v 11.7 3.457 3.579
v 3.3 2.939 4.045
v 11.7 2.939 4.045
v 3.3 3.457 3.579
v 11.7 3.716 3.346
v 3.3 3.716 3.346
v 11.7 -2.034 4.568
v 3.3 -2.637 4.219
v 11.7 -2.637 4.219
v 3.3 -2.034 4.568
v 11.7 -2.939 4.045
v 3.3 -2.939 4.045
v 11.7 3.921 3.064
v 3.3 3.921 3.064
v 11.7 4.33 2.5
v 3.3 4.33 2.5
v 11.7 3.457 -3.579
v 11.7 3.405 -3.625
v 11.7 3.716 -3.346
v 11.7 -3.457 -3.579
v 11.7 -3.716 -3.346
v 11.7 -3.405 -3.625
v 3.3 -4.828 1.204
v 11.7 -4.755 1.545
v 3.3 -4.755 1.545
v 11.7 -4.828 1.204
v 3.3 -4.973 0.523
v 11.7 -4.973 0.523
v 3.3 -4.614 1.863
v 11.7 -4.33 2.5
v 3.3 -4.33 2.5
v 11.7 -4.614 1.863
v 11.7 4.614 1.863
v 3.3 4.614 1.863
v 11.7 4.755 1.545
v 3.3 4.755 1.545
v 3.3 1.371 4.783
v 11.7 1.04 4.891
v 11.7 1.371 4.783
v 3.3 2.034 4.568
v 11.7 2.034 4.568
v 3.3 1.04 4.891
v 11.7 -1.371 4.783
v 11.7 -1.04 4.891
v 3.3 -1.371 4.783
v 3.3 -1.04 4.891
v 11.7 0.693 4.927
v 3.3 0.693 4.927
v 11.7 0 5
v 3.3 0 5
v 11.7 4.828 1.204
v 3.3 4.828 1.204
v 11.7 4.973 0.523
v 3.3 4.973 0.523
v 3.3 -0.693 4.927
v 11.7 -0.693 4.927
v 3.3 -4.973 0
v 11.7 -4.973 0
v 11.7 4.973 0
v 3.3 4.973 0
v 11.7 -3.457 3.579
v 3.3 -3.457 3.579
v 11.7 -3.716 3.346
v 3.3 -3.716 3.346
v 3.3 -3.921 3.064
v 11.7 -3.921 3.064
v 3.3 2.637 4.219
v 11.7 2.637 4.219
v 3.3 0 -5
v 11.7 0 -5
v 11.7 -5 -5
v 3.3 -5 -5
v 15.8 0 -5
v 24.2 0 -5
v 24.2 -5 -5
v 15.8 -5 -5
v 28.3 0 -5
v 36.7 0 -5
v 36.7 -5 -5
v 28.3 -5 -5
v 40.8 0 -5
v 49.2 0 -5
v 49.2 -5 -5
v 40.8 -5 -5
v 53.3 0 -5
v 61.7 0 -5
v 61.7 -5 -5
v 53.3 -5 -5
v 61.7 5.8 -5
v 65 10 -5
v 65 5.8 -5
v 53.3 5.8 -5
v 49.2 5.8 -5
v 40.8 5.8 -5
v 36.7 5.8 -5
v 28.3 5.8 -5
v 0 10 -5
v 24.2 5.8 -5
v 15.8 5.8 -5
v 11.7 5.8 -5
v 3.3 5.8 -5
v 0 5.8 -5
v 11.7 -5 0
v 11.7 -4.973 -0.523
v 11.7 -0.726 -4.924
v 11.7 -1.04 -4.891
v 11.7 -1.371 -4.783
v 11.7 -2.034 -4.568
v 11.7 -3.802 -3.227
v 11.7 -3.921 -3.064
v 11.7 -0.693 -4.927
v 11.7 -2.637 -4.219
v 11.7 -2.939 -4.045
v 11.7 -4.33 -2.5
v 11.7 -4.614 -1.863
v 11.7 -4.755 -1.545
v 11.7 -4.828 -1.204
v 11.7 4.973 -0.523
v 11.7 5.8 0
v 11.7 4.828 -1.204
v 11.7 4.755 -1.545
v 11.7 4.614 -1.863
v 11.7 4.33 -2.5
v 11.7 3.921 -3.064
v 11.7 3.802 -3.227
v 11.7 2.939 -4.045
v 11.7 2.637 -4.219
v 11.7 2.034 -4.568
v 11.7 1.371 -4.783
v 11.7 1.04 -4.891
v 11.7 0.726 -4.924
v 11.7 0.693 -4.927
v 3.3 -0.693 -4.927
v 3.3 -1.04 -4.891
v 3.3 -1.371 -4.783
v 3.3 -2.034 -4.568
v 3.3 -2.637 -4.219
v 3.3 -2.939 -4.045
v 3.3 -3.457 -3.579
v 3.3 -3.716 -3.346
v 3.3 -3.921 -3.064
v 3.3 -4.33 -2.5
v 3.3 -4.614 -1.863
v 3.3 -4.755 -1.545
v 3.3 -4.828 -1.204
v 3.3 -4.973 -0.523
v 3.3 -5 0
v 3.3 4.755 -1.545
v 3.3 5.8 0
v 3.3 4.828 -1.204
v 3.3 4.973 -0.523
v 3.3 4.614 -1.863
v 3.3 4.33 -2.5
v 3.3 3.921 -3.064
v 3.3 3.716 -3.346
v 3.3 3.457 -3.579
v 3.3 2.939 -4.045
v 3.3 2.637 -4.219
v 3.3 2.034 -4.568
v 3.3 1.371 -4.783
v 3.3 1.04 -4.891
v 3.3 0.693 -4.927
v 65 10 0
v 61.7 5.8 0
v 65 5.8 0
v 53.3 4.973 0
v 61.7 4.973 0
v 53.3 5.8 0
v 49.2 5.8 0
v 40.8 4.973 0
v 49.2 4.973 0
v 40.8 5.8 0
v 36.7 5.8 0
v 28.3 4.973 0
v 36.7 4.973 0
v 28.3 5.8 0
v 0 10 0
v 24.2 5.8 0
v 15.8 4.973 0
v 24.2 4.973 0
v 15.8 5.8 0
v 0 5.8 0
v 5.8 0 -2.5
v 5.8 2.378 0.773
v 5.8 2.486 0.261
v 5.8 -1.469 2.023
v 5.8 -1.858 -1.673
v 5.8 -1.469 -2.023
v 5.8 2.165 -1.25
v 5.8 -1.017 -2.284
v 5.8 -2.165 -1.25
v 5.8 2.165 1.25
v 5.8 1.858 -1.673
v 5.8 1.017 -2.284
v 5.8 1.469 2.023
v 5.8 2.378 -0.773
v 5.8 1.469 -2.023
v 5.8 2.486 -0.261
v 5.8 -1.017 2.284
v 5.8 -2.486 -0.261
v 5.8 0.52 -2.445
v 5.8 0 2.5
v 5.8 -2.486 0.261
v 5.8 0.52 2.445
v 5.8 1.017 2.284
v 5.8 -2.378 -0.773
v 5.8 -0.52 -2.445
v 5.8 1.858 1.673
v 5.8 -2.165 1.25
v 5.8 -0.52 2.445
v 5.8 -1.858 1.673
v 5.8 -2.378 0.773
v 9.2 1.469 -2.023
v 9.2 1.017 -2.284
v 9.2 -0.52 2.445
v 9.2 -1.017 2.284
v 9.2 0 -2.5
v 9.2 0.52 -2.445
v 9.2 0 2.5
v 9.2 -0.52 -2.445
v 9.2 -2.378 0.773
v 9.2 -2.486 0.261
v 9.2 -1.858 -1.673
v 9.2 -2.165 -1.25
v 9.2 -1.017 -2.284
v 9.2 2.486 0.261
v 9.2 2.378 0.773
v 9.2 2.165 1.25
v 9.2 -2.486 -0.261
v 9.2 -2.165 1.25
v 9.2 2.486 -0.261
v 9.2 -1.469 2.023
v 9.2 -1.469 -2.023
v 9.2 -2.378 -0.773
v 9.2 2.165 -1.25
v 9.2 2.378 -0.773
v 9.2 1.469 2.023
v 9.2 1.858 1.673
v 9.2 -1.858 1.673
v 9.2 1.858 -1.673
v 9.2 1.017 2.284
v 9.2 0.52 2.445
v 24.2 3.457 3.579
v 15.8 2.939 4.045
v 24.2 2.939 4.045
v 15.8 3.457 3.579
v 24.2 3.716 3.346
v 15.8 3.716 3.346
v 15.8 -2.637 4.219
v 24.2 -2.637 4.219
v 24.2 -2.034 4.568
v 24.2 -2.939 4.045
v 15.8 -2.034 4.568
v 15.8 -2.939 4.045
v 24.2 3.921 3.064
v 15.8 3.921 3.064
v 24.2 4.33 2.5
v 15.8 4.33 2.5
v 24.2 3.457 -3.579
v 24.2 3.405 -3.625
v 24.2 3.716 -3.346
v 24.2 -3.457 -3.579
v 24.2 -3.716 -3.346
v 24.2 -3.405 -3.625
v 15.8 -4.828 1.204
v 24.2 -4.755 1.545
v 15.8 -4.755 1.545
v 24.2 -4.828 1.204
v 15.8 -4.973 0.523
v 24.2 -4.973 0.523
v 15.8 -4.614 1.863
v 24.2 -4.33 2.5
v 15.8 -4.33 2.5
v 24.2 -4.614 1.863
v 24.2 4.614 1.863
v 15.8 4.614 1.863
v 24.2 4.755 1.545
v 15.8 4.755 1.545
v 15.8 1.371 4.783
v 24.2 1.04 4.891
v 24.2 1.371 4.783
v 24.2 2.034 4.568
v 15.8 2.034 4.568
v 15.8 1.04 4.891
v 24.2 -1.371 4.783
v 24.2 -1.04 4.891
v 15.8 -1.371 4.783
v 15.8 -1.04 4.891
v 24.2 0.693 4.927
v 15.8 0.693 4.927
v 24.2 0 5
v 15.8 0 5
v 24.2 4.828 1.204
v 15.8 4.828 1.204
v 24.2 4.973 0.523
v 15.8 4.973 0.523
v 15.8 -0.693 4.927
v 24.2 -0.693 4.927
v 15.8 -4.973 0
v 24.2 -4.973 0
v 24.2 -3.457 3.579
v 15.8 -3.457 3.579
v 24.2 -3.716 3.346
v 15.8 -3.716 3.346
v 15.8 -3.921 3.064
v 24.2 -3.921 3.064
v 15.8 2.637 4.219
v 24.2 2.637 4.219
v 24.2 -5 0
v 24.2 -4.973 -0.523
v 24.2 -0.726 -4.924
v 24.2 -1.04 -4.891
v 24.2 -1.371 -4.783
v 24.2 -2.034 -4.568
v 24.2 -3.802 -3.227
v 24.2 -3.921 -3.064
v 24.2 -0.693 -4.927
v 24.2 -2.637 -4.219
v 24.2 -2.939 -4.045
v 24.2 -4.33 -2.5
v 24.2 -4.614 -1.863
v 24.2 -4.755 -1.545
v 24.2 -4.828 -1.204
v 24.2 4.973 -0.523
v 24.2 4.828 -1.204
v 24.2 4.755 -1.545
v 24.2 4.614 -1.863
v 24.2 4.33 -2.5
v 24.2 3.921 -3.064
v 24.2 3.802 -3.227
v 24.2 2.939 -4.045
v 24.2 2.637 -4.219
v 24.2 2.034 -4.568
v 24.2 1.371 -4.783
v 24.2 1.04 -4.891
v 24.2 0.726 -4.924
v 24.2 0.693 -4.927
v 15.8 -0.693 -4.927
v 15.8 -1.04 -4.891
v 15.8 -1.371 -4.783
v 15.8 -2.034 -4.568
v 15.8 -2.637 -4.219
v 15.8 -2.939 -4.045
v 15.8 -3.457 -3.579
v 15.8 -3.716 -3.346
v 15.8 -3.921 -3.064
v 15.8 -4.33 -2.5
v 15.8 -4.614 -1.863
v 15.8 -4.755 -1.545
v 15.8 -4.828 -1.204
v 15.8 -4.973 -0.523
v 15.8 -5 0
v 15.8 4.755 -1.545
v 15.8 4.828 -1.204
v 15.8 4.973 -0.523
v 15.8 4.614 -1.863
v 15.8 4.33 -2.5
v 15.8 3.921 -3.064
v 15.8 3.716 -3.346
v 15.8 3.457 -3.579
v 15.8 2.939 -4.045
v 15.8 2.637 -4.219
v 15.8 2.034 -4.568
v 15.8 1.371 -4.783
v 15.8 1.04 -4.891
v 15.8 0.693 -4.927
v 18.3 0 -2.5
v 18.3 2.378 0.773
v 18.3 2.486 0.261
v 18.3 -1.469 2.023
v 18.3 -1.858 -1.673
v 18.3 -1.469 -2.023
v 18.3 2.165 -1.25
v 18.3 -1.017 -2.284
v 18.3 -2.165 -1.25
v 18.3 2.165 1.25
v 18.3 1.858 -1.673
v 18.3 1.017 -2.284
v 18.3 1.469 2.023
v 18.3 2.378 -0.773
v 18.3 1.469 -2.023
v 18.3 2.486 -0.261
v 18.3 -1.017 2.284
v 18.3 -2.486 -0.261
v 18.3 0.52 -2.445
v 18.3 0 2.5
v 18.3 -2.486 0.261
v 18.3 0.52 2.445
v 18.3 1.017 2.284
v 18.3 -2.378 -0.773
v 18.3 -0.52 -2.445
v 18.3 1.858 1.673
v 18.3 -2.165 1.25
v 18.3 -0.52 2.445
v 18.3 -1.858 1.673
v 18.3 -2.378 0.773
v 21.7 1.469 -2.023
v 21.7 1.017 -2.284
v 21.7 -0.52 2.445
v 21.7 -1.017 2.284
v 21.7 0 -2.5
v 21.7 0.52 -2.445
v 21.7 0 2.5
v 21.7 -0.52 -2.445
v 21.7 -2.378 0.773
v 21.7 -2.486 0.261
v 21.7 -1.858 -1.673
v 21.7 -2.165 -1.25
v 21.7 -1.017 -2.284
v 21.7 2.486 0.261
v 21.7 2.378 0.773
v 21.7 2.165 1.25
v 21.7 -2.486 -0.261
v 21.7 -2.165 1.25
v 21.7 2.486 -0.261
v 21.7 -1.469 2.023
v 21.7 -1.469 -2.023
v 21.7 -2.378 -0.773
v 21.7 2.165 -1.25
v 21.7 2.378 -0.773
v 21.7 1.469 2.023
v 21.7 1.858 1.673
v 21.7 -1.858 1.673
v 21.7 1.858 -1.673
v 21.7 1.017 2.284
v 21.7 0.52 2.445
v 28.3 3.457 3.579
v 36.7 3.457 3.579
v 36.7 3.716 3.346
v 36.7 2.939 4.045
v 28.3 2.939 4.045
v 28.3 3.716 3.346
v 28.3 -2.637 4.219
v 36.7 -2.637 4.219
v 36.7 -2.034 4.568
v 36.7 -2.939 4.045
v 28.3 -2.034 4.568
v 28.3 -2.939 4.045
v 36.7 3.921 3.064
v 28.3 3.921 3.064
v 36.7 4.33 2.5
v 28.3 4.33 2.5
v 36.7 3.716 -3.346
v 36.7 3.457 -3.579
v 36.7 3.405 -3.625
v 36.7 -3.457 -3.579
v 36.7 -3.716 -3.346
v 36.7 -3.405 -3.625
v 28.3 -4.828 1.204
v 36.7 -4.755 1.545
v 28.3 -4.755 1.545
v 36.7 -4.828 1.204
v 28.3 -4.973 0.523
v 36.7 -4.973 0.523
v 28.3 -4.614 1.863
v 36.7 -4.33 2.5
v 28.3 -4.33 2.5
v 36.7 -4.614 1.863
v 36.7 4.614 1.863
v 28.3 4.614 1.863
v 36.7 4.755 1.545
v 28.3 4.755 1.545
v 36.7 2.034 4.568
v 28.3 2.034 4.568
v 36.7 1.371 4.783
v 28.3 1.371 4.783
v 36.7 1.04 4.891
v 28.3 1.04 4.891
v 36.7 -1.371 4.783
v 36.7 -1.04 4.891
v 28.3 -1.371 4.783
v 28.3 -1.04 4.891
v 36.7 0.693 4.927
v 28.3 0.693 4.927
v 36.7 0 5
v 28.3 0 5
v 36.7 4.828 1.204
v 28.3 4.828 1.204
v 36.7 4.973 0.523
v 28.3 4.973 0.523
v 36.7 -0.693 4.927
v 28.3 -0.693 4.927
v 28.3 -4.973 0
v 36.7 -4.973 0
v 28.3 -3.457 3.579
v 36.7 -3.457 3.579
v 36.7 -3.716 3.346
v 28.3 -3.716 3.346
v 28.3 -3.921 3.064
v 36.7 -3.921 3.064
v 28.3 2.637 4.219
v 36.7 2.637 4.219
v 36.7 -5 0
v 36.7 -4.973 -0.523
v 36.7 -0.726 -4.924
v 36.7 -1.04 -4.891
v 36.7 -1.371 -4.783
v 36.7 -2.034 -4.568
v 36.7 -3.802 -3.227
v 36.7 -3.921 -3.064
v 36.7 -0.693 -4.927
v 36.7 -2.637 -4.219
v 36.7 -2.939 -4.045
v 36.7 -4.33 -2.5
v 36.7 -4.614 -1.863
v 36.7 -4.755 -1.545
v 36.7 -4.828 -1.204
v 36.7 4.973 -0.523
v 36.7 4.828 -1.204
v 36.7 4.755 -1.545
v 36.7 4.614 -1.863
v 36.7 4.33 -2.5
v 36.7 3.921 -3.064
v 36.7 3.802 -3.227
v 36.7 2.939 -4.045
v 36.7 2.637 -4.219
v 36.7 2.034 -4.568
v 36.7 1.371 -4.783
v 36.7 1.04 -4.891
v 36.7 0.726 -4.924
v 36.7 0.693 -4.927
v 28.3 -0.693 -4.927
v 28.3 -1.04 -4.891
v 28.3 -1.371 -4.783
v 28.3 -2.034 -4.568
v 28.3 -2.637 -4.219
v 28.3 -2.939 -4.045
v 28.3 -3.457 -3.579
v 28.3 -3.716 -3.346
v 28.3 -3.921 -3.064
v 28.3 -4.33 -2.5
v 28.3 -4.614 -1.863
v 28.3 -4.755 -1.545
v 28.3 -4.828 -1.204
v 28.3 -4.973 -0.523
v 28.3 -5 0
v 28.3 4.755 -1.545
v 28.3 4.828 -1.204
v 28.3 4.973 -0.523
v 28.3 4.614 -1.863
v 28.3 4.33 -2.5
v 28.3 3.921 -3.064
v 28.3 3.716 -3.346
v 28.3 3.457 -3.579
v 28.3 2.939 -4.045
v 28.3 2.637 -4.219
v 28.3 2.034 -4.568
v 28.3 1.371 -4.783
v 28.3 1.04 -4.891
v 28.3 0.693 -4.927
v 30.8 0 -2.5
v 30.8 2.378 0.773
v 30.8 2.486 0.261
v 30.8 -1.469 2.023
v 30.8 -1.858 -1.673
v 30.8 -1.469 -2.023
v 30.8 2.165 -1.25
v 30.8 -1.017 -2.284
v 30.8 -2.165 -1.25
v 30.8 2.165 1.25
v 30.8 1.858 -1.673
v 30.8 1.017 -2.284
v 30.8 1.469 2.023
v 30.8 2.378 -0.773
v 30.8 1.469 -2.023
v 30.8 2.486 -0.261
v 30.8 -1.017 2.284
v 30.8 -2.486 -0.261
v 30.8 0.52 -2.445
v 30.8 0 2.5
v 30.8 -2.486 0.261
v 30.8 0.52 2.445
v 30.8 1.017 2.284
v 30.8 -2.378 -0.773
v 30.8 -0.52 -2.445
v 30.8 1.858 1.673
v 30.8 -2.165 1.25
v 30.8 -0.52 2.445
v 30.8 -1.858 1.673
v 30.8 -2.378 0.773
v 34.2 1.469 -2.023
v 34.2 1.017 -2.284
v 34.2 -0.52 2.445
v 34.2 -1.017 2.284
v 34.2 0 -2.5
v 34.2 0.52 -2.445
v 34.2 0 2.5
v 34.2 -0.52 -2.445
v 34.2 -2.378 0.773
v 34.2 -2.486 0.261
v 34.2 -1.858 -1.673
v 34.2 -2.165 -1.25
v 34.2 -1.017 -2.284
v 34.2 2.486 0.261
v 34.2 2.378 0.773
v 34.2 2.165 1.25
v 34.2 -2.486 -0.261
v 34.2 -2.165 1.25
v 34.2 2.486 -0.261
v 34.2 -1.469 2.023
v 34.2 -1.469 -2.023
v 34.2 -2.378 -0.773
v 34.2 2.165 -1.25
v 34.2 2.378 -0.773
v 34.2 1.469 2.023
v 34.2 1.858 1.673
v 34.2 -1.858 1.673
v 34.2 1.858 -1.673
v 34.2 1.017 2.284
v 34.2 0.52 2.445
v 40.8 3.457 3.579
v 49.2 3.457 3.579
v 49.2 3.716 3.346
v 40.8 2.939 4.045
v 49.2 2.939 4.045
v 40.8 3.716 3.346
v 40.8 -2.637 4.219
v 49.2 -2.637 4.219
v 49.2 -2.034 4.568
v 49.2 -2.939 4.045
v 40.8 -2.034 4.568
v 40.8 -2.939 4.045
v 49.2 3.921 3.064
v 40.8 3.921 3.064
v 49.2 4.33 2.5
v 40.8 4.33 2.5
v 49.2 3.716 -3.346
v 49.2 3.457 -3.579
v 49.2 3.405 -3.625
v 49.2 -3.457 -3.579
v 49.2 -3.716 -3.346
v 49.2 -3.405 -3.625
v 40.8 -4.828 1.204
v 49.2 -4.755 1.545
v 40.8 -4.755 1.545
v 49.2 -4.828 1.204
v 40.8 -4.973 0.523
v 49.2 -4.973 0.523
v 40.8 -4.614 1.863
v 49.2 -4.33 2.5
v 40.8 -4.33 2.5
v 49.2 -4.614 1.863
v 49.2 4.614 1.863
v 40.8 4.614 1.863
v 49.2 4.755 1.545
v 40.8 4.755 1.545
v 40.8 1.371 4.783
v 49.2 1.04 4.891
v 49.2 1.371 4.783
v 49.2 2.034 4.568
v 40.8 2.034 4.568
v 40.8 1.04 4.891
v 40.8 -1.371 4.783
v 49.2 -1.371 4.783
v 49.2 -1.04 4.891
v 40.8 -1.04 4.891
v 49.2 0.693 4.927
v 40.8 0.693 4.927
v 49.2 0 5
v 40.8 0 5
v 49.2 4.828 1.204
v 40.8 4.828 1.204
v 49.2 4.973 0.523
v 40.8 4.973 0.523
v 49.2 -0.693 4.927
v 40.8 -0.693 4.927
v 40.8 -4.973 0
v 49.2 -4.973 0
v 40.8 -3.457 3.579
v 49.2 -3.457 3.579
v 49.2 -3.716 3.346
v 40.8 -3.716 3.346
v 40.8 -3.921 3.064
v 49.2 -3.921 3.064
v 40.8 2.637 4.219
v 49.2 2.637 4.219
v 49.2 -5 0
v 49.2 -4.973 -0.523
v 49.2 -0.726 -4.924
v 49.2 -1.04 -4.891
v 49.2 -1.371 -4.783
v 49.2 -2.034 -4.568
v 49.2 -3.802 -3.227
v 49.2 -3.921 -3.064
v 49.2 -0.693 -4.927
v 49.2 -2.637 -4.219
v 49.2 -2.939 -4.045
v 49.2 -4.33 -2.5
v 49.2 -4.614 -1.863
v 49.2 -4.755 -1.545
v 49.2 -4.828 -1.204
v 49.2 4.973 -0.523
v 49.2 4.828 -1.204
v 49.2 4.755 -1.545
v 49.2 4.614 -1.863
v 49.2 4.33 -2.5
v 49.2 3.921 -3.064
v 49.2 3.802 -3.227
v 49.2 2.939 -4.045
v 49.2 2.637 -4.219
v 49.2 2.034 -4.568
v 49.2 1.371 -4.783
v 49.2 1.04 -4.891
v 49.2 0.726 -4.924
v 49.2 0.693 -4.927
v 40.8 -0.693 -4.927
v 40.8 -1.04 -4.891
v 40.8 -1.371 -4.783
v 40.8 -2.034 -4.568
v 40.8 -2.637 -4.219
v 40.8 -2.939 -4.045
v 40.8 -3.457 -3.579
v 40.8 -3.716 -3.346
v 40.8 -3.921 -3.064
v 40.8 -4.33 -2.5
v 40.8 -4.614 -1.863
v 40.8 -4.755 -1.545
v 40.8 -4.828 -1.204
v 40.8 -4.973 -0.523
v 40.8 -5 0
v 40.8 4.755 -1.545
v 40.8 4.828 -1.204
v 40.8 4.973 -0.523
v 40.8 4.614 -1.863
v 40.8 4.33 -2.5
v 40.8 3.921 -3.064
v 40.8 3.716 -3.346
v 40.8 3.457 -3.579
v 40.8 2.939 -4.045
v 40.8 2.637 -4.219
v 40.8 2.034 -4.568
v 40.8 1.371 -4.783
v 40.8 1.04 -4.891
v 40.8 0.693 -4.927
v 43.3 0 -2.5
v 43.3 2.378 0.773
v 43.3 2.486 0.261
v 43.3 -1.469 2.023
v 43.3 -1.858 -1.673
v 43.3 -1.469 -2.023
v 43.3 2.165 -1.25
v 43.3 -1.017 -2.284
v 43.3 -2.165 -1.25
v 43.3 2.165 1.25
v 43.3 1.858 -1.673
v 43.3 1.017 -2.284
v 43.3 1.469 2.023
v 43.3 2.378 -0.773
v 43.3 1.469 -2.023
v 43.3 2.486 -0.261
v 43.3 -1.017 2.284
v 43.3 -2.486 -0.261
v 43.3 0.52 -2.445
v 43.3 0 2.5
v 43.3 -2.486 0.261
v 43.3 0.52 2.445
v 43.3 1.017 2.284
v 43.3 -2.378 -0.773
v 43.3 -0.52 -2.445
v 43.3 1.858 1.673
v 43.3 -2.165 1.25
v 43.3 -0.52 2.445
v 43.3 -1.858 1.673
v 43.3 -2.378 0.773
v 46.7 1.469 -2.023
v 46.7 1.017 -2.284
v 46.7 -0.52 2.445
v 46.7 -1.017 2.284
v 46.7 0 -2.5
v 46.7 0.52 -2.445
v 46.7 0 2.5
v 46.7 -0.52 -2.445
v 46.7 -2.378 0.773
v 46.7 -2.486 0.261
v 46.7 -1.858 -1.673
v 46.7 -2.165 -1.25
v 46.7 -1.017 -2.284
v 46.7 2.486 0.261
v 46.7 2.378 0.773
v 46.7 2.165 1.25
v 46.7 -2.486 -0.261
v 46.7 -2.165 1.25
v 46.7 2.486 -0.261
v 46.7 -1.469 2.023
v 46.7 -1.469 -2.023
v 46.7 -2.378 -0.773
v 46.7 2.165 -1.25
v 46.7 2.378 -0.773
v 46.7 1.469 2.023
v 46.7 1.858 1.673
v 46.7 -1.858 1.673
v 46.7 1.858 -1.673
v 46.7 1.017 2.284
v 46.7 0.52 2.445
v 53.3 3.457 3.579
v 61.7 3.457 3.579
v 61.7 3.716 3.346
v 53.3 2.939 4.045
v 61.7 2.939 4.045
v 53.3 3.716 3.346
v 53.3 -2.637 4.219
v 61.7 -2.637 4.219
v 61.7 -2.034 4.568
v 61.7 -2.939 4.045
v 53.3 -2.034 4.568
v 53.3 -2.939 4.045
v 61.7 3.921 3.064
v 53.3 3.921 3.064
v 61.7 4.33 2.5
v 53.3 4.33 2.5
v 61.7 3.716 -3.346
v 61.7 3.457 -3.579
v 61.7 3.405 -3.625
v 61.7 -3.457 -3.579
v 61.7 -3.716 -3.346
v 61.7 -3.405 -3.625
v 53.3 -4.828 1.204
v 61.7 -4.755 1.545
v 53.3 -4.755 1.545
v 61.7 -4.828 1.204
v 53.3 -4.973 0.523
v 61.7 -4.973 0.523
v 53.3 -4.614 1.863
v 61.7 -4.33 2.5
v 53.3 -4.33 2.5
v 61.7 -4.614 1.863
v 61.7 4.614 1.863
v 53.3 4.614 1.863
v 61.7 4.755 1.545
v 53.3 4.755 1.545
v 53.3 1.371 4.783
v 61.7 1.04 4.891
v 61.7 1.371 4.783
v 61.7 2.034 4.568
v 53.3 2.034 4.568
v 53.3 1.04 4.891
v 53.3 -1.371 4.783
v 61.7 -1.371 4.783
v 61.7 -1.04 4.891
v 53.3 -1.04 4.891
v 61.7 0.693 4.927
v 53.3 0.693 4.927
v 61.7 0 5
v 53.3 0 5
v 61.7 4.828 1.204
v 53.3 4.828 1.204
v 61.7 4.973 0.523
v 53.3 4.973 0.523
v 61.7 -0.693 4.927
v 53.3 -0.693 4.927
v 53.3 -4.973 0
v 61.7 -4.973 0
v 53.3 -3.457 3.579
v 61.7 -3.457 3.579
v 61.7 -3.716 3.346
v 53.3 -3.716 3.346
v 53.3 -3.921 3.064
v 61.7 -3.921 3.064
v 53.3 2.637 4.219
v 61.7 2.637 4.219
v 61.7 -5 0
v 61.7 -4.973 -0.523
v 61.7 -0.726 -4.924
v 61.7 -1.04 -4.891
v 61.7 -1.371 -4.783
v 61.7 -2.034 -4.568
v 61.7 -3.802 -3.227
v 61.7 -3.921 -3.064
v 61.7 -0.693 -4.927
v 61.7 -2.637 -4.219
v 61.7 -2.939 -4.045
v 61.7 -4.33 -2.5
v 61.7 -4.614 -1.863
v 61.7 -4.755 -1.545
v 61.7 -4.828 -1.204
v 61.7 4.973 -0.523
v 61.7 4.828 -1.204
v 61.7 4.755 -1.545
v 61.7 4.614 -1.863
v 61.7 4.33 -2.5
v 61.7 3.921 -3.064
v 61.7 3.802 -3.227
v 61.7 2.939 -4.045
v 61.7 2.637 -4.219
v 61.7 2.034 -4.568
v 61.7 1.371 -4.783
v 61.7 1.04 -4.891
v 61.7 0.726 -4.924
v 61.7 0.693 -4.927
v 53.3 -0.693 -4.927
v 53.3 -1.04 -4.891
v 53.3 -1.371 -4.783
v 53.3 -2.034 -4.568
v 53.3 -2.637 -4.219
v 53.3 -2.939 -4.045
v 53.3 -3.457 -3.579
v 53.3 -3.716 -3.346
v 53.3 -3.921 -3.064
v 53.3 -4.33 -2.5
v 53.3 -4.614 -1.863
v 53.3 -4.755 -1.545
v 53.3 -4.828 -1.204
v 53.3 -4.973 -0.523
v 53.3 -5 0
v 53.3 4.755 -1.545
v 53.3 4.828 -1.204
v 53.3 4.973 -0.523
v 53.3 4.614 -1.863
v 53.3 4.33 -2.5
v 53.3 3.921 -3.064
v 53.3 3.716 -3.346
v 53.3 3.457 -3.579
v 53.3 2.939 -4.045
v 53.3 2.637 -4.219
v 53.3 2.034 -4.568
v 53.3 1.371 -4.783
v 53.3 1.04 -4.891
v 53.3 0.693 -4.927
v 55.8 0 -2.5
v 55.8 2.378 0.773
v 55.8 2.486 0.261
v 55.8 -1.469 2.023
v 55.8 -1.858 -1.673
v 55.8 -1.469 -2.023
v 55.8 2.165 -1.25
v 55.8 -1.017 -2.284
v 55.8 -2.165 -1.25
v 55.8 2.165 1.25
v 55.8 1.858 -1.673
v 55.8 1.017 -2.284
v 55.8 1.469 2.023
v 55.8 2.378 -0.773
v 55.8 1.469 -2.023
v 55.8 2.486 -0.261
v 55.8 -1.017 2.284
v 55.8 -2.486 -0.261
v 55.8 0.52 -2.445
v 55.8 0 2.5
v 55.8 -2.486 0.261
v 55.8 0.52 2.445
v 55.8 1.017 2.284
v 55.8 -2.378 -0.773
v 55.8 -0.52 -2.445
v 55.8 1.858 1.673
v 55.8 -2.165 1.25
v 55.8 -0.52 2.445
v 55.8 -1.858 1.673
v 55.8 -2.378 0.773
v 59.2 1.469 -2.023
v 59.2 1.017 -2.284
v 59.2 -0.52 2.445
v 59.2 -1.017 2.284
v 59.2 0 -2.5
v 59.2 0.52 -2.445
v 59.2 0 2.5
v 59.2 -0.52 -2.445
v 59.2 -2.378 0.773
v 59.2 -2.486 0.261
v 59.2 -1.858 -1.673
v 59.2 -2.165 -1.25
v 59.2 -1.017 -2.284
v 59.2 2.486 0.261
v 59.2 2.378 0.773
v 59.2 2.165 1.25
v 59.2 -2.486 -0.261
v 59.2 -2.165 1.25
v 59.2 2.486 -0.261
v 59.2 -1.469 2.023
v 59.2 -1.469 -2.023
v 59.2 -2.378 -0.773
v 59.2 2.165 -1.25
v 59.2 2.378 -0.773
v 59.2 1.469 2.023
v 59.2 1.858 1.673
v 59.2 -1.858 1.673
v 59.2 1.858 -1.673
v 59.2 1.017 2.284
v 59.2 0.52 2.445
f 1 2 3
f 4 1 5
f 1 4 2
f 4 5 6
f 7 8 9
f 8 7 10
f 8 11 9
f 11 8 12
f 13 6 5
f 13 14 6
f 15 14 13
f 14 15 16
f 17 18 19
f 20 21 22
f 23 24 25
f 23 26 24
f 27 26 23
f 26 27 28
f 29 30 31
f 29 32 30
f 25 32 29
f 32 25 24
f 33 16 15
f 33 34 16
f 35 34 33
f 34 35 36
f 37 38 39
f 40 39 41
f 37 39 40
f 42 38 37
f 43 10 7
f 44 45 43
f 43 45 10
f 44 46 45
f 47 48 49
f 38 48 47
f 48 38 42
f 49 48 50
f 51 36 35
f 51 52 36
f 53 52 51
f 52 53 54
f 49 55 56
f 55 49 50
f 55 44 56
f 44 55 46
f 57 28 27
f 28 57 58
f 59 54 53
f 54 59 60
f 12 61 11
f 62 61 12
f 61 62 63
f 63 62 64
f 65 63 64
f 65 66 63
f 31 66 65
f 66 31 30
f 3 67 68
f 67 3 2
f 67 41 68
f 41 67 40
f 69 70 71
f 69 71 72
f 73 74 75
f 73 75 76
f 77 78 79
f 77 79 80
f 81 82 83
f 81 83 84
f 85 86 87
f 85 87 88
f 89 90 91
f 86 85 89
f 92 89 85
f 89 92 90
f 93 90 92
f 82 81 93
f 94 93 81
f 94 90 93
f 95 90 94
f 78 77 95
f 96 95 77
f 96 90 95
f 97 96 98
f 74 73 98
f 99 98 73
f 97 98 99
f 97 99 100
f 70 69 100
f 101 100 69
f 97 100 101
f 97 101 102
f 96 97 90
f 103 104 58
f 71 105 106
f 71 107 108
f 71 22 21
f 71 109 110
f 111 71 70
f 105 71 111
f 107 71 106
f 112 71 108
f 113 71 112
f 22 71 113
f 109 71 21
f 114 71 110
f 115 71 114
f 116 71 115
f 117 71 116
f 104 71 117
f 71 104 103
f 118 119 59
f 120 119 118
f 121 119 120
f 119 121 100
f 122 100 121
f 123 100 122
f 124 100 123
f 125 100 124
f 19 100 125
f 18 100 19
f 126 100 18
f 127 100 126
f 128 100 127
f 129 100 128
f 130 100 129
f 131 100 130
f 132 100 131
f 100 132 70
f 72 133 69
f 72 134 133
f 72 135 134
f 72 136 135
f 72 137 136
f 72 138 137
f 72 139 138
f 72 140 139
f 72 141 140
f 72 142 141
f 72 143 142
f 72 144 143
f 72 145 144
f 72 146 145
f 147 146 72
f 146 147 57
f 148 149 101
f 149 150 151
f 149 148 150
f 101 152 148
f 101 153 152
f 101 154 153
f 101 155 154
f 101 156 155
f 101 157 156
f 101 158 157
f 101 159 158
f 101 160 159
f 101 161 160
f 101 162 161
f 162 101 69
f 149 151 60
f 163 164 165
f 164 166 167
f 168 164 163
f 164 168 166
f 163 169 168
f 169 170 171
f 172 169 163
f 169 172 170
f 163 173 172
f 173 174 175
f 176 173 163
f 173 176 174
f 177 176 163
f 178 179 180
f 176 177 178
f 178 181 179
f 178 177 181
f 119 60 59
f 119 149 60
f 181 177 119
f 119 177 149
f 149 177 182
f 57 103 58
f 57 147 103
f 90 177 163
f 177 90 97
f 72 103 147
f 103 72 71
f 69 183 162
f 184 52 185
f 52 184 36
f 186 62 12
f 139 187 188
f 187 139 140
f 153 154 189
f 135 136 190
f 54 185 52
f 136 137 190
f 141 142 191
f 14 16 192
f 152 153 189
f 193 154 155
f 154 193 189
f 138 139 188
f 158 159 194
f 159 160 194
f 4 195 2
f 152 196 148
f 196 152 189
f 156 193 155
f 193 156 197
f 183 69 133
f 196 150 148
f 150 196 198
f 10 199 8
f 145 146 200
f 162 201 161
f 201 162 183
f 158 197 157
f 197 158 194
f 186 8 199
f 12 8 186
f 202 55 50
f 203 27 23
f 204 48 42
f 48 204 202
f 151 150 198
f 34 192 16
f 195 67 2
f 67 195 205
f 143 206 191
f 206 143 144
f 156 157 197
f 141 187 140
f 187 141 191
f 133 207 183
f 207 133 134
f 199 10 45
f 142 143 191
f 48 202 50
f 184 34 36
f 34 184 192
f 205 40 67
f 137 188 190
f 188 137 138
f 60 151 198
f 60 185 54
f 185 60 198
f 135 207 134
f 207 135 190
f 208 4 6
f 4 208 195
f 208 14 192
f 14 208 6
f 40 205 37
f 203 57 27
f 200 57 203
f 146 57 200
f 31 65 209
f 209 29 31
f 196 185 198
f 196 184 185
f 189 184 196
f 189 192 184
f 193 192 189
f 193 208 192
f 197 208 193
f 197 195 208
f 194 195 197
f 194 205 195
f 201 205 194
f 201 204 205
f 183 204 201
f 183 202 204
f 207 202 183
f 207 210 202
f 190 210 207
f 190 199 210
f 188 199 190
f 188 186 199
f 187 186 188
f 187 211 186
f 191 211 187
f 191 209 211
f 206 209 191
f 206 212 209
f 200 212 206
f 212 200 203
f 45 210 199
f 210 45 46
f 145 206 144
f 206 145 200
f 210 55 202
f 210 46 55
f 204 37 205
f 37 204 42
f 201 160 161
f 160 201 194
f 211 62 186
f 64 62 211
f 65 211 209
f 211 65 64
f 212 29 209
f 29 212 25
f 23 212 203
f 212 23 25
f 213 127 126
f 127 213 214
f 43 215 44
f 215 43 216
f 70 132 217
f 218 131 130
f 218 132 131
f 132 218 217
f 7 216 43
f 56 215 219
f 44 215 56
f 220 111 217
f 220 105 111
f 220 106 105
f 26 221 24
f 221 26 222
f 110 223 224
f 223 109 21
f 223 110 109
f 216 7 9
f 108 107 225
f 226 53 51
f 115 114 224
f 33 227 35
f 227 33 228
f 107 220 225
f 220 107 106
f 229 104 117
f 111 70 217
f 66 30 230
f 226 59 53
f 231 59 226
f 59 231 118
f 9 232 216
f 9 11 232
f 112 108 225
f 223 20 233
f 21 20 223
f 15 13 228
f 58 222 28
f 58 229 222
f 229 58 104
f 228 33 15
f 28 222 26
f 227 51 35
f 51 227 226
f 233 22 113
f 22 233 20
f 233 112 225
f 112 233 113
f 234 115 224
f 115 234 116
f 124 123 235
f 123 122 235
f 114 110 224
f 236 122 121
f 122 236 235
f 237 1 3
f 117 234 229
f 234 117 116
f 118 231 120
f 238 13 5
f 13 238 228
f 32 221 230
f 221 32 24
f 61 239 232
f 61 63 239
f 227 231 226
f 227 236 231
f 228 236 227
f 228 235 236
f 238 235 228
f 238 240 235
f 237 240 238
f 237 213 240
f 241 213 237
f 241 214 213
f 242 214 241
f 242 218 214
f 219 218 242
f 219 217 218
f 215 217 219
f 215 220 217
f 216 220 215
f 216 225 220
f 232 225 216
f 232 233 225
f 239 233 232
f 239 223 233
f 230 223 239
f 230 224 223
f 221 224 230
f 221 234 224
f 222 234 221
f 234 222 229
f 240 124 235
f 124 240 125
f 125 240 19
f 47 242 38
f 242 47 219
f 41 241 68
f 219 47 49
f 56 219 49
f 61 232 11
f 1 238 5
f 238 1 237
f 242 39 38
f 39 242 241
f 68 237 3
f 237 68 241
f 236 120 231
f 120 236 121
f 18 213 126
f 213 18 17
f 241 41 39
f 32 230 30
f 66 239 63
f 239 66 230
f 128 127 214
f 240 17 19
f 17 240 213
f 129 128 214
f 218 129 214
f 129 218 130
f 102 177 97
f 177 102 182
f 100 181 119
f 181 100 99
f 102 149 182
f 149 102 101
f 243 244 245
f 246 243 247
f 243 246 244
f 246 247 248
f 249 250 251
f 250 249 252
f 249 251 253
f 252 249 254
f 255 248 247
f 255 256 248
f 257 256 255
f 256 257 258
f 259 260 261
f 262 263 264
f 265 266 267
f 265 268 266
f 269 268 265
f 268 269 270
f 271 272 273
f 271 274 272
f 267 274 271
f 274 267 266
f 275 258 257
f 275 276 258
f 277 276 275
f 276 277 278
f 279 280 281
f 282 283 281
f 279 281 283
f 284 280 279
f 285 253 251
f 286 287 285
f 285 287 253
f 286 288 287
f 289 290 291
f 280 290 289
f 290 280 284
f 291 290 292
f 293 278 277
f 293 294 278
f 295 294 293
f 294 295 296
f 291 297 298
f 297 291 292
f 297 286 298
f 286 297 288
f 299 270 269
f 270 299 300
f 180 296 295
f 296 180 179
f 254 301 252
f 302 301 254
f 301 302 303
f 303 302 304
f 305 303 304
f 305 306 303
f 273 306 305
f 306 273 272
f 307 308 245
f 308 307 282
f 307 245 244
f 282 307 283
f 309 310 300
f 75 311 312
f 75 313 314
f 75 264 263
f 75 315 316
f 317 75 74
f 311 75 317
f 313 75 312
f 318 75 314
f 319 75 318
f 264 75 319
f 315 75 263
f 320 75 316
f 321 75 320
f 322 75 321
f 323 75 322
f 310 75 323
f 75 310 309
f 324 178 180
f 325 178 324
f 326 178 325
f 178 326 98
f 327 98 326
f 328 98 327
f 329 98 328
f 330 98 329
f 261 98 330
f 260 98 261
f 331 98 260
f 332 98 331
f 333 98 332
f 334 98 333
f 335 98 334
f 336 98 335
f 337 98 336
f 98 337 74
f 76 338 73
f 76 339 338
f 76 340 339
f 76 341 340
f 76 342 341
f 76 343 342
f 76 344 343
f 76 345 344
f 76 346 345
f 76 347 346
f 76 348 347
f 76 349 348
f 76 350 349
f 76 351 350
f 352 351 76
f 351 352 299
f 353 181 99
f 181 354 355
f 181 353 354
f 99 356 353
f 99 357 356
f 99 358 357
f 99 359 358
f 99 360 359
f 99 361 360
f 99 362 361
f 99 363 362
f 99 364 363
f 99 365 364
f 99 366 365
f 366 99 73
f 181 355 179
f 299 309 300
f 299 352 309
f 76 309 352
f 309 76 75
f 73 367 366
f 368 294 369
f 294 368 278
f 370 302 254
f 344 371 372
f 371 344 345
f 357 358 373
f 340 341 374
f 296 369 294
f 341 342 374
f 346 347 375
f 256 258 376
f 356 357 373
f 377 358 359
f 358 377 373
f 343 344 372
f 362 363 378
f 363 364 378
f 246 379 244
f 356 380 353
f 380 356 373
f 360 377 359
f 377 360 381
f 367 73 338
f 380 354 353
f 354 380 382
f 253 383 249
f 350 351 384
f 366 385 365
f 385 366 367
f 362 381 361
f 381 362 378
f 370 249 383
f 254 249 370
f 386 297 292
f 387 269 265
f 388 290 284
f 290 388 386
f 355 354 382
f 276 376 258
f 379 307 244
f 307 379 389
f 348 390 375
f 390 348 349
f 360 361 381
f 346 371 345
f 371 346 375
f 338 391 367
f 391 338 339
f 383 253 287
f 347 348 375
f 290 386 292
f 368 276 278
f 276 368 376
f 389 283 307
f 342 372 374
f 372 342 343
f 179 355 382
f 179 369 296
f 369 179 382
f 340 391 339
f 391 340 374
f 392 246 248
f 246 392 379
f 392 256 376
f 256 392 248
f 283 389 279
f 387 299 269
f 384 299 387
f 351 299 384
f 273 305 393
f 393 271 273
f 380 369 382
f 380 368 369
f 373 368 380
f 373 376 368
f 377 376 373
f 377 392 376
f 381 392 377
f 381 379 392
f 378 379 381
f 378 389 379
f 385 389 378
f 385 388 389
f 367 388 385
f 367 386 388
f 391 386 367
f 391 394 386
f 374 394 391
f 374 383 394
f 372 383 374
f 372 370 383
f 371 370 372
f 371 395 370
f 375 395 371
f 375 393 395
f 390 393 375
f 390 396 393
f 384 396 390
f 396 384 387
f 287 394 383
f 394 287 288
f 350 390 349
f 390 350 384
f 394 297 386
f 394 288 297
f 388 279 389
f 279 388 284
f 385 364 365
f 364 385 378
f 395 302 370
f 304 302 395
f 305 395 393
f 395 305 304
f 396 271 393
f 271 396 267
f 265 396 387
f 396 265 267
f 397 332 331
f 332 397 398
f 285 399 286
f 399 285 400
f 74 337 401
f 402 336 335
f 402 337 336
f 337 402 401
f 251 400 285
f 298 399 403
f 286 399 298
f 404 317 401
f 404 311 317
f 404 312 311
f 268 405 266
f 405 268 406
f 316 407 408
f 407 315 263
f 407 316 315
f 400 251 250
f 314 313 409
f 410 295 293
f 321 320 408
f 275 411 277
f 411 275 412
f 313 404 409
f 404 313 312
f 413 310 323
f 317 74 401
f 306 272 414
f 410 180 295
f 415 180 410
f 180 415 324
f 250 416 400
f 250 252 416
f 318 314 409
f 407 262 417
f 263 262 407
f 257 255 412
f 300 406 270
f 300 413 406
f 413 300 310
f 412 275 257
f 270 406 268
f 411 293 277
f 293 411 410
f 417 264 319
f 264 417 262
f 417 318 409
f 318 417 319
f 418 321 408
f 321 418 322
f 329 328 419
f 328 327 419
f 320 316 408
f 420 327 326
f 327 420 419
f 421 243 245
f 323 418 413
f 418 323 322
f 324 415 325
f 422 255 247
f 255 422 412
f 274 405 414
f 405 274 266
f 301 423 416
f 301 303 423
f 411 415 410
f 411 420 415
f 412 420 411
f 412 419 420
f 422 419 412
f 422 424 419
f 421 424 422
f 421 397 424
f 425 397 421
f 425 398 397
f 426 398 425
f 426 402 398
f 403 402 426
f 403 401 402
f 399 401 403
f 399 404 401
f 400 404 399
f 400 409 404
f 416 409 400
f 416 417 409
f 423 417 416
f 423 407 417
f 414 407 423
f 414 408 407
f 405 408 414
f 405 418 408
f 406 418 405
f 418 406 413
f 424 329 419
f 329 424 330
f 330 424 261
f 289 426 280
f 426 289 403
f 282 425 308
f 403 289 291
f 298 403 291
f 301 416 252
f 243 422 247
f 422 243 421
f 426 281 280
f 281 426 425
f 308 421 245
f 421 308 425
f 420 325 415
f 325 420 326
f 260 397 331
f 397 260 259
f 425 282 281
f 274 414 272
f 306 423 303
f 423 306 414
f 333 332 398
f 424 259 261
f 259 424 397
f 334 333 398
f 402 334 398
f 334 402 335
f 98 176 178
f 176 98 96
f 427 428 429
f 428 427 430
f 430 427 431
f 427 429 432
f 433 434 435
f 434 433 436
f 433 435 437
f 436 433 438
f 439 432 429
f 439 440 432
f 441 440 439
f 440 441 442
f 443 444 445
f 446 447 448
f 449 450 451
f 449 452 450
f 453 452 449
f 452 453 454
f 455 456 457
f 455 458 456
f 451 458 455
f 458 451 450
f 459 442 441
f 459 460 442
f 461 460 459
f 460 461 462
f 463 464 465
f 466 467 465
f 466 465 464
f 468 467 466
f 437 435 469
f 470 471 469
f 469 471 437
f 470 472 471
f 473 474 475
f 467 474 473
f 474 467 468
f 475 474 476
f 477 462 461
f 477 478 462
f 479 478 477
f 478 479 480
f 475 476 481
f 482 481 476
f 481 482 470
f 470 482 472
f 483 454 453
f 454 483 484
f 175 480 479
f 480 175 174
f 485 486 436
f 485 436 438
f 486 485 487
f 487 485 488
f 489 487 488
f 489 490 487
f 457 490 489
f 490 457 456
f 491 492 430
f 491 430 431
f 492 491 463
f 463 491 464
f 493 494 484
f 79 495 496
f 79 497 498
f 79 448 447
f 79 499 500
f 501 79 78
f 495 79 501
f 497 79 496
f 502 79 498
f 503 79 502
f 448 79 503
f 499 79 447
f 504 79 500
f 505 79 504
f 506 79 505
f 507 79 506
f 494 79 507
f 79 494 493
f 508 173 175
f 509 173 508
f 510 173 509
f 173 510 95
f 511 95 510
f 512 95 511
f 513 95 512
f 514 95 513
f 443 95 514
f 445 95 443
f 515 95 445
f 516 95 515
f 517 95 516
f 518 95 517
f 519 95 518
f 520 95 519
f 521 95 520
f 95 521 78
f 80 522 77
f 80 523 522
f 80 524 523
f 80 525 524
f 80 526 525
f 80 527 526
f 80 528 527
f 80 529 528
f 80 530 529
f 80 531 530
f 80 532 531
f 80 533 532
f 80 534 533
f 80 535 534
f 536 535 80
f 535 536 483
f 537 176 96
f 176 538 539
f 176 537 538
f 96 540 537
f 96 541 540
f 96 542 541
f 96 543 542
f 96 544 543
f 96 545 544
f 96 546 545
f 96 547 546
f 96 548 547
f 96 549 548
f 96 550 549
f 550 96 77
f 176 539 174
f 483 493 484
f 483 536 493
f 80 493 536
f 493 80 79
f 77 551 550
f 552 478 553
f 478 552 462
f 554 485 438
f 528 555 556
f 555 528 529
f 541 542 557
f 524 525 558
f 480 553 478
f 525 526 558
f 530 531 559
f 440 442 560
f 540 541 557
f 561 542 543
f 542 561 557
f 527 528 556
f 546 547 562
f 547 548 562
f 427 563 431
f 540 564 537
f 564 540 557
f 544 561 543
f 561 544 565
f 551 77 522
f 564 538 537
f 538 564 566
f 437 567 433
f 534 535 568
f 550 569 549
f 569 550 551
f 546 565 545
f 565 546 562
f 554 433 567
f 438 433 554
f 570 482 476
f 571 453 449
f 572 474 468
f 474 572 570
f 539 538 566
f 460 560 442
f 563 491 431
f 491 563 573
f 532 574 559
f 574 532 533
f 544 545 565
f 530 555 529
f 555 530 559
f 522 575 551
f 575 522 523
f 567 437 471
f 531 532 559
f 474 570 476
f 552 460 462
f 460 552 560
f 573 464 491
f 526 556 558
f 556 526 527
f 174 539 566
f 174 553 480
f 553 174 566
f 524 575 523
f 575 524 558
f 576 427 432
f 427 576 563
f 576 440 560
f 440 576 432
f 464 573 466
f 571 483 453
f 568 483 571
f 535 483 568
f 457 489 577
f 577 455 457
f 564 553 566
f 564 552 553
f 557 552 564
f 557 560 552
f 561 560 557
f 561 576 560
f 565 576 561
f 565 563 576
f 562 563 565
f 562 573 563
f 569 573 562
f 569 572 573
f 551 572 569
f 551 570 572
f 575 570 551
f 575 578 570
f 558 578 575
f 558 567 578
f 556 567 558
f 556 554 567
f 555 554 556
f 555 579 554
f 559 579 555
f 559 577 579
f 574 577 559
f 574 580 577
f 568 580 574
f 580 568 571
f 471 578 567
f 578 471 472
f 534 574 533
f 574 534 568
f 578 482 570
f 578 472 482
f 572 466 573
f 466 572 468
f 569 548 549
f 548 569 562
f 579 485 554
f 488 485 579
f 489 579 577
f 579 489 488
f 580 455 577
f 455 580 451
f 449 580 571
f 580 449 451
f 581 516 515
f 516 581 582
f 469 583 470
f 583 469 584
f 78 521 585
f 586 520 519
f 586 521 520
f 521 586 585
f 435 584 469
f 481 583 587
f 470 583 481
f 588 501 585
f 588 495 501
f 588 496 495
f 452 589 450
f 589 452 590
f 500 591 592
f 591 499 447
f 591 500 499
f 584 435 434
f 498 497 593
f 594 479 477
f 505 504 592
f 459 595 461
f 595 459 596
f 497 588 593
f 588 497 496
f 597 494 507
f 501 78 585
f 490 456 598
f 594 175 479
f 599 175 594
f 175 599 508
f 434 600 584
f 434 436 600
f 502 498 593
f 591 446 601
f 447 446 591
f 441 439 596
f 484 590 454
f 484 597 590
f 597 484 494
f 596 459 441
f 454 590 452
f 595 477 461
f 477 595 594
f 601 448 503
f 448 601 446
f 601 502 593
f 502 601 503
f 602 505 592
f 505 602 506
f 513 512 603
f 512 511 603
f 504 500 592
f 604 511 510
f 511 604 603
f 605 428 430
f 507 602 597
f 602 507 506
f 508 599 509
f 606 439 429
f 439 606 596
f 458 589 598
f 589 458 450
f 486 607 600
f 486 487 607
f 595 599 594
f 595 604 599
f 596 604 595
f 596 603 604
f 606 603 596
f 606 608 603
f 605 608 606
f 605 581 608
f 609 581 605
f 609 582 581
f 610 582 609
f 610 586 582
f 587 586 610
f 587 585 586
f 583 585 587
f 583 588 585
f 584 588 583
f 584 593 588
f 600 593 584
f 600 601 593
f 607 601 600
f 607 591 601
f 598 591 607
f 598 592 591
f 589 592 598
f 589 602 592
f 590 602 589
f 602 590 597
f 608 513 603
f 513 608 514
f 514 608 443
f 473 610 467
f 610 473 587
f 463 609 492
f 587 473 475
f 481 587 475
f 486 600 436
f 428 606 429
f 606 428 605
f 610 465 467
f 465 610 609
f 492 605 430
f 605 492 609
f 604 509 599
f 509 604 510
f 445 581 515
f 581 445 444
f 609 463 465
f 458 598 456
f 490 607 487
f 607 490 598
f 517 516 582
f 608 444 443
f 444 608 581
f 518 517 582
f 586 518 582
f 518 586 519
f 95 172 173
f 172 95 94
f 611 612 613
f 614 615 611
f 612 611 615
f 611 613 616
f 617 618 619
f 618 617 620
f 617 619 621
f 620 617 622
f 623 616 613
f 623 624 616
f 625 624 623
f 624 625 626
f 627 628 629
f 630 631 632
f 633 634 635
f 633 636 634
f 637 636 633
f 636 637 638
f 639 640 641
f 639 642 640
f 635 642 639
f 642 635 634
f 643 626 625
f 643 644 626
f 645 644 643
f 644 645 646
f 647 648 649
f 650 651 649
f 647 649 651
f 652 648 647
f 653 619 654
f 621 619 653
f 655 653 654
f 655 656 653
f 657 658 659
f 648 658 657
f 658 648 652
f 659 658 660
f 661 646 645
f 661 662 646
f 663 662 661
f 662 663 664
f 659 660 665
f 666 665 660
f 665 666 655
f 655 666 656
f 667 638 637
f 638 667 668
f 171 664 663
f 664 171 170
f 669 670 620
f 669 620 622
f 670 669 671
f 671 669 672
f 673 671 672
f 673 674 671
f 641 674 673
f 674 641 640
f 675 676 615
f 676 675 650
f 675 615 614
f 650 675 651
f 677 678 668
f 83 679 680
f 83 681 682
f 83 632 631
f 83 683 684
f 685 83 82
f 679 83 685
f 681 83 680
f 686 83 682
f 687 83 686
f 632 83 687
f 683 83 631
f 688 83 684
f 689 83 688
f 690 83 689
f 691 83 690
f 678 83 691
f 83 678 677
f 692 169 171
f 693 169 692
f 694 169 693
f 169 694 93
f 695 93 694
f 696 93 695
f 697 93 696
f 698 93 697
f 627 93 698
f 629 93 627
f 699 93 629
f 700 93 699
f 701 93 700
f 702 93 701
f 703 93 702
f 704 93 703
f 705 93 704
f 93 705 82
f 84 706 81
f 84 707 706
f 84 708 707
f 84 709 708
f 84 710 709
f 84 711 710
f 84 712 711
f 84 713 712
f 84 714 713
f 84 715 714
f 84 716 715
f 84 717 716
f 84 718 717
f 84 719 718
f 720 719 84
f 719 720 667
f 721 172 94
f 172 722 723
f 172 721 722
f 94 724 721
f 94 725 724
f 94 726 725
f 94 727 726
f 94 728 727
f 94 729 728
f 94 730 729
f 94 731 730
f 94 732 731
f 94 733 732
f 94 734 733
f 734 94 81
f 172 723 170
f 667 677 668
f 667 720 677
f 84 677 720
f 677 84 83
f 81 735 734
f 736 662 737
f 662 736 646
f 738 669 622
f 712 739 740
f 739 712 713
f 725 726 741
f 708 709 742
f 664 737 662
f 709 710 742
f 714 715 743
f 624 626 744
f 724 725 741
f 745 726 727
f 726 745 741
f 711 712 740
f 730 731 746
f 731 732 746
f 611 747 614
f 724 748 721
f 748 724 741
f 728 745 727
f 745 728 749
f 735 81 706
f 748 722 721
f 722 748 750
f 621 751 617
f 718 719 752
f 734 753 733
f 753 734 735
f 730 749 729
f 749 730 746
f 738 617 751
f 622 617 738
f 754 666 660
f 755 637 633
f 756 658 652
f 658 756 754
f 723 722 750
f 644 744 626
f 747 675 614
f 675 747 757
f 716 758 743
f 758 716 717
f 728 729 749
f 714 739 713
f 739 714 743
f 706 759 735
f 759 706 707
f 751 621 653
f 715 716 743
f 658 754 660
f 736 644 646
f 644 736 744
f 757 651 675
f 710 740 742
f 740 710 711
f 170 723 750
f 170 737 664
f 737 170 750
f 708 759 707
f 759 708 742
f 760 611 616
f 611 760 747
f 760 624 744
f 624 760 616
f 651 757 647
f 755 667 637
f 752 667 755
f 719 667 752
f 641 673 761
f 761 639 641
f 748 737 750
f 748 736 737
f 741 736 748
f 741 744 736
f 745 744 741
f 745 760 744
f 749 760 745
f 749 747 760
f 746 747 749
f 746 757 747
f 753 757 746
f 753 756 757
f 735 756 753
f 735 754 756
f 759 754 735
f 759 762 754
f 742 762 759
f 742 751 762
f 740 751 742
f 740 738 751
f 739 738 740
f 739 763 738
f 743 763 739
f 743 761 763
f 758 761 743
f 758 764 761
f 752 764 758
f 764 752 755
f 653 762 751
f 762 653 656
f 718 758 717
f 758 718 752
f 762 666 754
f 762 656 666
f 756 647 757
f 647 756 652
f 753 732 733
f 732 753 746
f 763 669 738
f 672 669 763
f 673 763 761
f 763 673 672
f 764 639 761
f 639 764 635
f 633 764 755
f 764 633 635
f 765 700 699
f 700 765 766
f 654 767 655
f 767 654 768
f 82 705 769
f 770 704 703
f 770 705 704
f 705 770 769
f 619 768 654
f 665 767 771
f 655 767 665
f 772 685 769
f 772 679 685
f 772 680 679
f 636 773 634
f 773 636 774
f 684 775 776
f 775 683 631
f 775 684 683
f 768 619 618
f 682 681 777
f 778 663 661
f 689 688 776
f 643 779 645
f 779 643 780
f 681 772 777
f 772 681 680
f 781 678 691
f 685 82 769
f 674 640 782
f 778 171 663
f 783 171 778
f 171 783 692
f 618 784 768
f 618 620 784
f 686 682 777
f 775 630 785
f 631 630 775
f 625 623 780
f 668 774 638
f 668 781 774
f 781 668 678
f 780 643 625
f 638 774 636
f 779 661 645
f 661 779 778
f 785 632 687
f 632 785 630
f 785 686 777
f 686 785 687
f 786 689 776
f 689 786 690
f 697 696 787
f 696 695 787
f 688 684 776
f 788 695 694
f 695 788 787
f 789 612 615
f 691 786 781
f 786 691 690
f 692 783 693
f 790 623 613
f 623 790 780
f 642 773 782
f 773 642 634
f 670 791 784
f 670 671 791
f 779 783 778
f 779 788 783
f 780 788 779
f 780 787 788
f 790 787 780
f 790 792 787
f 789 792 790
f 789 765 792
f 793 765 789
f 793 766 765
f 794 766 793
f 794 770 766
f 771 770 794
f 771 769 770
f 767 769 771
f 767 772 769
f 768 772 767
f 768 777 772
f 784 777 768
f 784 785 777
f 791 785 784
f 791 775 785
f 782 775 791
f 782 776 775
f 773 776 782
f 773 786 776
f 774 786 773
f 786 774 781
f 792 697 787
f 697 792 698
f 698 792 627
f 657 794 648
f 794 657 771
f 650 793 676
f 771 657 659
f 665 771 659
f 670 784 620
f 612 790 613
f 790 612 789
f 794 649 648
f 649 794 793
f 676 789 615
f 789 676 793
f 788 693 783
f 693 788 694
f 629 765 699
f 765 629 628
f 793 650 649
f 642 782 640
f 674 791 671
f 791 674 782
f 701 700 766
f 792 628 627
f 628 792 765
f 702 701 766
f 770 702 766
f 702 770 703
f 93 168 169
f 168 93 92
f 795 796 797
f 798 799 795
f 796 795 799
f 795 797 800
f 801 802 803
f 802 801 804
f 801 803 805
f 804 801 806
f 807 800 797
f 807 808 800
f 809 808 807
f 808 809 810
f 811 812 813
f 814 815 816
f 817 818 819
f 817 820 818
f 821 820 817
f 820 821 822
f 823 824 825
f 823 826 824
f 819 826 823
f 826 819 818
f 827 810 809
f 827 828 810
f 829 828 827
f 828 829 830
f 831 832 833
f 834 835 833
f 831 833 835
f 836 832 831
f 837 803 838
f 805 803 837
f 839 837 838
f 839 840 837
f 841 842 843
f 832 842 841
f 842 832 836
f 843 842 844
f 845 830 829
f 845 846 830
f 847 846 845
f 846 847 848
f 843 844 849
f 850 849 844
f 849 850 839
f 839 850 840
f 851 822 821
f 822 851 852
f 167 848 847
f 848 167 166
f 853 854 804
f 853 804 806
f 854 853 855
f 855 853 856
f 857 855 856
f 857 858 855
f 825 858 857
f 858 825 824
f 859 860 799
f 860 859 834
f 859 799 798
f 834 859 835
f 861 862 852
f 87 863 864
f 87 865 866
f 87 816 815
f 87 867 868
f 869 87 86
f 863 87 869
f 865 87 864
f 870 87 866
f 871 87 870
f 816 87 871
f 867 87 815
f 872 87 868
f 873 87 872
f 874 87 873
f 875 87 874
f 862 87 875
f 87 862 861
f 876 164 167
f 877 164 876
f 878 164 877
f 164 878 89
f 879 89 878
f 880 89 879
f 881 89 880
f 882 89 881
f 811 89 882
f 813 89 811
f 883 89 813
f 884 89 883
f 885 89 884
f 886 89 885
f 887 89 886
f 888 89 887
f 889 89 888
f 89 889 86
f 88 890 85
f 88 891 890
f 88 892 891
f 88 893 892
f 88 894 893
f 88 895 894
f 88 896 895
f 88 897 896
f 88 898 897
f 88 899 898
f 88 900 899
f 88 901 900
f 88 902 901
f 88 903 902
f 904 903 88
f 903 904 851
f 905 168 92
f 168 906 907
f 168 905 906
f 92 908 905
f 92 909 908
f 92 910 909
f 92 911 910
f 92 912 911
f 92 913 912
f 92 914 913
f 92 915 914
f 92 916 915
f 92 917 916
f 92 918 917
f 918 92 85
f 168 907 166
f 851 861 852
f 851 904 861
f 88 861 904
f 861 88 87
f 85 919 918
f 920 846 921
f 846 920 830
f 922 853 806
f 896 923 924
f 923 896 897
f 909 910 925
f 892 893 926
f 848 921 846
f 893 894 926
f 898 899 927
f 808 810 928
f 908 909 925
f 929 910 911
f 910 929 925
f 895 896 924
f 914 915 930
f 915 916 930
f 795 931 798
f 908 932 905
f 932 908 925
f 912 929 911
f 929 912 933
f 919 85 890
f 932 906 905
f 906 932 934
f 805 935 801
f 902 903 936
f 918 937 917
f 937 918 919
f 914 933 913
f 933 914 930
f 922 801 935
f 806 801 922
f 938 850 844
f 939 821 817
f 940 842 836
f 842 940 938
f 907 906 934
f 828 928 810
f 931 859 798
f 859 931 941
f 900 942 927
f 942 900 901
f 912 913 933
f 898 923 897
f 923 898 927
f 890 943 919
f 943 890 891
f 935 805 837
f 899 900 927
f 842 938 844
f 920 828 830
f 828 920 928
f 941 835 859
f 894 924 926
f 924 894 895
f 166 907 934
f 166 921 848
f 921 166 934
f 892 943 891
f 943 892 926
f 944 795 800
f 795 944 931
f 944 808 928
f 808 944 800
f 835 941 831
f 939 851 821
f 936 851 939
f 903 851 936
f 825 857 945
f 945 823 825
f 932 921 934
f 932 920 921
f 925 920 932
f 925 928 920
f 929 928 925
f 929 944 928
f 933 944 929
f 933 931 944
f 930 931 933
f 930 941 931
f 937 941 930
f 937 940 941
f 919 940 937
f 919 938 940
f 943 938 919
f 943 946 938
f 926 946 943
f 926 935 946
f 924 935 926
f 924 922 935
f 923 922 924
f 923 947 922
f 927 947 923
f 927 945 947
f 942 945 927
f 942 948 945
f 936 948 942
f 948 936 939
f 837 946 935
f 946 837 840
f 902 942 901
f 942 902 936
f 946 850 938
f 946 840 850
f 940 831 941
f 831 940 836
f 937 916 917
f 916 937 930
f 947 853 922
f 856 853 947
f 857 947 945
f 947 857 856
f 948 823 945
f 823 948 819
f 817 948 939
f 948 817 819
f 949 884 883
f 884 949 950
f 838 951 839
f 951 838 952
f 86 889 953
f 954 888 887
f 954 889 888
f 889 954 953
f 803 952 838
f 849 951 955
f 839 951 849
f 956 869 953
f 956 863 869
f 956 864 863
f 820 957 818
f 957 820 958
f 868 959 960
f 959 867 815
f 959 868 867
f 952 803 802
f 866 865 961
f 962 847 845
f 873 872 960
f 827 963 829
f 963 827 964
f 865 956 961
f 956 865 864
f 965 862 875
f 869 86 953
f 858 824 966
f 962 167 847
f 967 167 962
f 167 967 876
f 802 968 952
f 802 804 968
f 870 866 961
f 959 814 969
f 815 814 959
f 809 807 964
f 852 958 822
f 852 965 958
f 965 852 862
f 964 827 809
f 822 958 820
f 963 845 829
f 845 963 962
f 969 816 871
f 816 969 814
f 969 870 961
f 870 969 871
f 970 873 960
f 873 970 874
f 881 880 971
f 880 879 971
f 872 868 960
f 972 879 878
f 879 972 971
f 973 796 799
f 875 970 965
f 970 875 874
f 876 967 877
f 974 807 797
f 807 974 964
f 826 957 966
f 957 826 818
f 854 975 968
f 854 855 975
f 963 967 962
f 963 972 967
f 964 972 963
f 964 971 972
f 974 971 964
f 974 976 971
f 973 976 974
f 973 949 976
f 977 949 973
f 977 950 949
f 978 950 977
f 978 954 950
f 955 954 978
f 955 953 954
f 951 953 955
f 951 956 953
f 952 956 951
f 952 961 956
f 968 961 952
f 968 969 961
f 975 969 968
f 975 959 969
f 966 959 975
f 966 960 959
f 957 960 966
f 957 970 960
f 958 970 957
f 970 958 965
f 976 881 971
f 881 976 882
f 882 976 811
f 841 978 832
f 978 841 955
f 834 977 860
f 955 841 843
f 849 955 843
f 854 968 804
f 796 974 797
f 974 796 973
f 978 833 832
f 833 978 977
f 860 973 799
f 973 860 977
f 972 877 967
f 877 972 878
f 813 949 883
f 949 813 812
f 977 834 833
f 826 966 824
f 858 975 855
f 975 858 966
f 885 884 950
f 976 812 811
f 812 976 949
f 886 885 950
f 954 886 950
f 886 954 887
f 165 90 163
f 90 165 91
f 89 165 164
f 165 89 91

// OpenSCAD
// What diameter or thickness should the hinge have (in 0.01 mm units)?
//hinge_dia = 1000; // [1:5000]  default 635

// How much gap should be left between separate parts (in 0.01 mm units)?
//hinge_gap = 80; // [1:2000]  default 40

epsilon = 0.00001;  // Used to prevent manifold problems

module hingepair(x0_extra=0, x1_extra=0) {
	union() {
		translate([0,0,-x0_extra]) cylinder(h=0.25+x0_extra, r=0.5);
		translate([0,0,0.25-epsilon]) cylinder(h=0.25, r1=0.5, r2=0.25);
		translate([0,0,1+epsilon]) cylinder(h=0.25, r1=0.25, r2=0.5);
		translate([0,0,1.25]) cylinder(h=0.25+x1_extra, r=0.5);
	}
}

module hingecore(gap, x0_extra=0, x1_extra=0) {
	union() {
		difference() {
			union() {
				cylinder(h=1.5, r=0.5);
				//translate([-0.5,0,0.25+gap])
				//	cube(size=[1,1,1-gap-gap]);
				translate([0,0,0.25+gap])
					cube(size=[0.5,1,1-gap-gap]);
				translate([0,-0.5,0.25+gap])
					cube(size=[0.5,0.5,1-gap-gap]);
			}
			translate([0,0,0.25+gap-0.5]) cylinder(h=0.75, r1=1, r2=0.25);
			translate([0,0,1-gap]) cylinder(h=0.75, r1=0.25, r2=1);
		}
		//translate([-0.5,0.5+gap,0])
		//	cube(size=[1,0.5-gap,1.5]);
		translate([0,0.5+gap,-x0_extra])
			cube(size=[0.5,0.5-gap,1.5+x0_extra+x1_extra]);
	}
}

module hingeedge(gap, x0_extra=0, x1_extra=0) {
	union() {
		hingepair(x0_extra, x1_extra);
		//translate([-0.5,-1,0])
		//	cube(size=[1,0.5-gap,1.5]);
		//translate([-0.5,-1,0])
		//	cube(size=[1,1,0.25]);
		//translate([-0.5,-1,1.25])
		//	cube(size=[1,1,0.25]);
		translate([0,-1,-x0_extra])
			cube(size=[0.5,0.5-gap,1.5+x0_extra+x1_extra]);
		translate([0,-1,-x0_extra])
			cube(size=[0.5,1,0.25+x0_extra]);
		translate([0,-1,1.25])
			cube(size=[0.5,1,0.25+x1_extra]);
		translate([0,0,1.25])
			cube(size=[0.5,0.5,0.25+x1_extra]);
		translate([0,0,-x0_extra])
			cube(size=[0.5,0.5,0.25+x0_extra]);
	}
}

module single_hinge(thick, realgap, x0_extra=0, x1_extra=0) {
	hingeedge(realgap / thick, x0_extra, x1_extra);
	hingecore(realgap / thick, x0_extra, x1_extra);
}

module hinge(hinge_dia, hinge_gap, amount=1) {
	scale([hinge_dia, hinge_dia, hinge_dia])
	rotate([0,90,0])
	for (a = [0:amount-1]) {
		translate([0,0,a*1.25]) {
			if (amount == 1) {
				single_hinge(hinge_dia, hinge_gap);
			} else if (a == 0) {
				single_hinge(hinge_dia, hinge_gap, x1_extra=epsilon);
			} else if (a == amount-1) {
				single_hinge(hinge_dia, hinge_gap, x0_extra=epsilon);
			} else {
				// middle piece
				single_hinge(hinge_dia, hinge_gap, x0_extra=epsilon, x1=epsilon);
			}
		}
	}
}

// half hinge
module hinge_edge(hinge_dia, hinge_gap, amount=1) {
	scale([hinge_dia, hinge_dia, hinge_dia])
	rotate([0,90,0])
	for (a = [0:amount-1]) {
		translate([0,0,a*1.25]) {
			if (amount == 1) {
				hingeedge(hinge_gap/hinge_dia);
			} else if (a == 0) {
				hingeedge(hinge_gap/hinge_dia, x1_extra=epsilon);
			} else if (a == amount-1) {
				hingeedge(hinge_gap/hinge_dia, x0_extra=epsilon);
			} else {
				// middle piece
				hingeedge(hinge_gap/hinge_dia, x0_extra=epsilon, x1=epsilon);
			}
		}
	}
}

// half hinge
module hinge_core(hinge_dia, hinge_gap, amount=1) {
	scale([hinge_dia, hinge_dia, hinge_dia])
	rotate([0,90,0])
	for (a = [0:amount-1]) {
		translate([0,0,a*1.25]) {
			if (amount == 1) {
				hingecore(hinge_gap/hinge_dia);
			} else if (a == 0) {
				hingecore(hinge_gap/hinge_dia, x1_extra=epsilon);
			} else if (a == amount-1) {
				hingecore(hinge_gap/hinge_dia, x0_extra=epsilon);
			} else {
				// middle piece
				hingecore(hinge_gap/hinge_dia, x0_extra=epsilon, x1=epsilon);
			}
		}
	}
}

module demo(t, rg) {
	scale([t,t,t])
	translate([-2.75,0,0.5])
	rotate(a=[0,90,0])
	union() {
		hinge(t, rg);
		translate([0,0,1.25]) hinge(t, rg);
		translate([0,0,2.5]) hinge(t, rg);
		translate([0,0,3.75]) hinge(t, rg);
		translate([0,1,0]) cube(size=[0.5,2,5.25]);
		translate([0,-3,0]) cube(size=[0.5,2,5.25]);
	}
}

//demo(hinge_dia/100, hinge_gap/100);

/*scale([hinge_dia/100, hinge_dia/100, hinge_dia/100])
rotate([0,90,180])
single_hinge(hinge_dia/100, hinge_gap/100);
*/

// length will be dia*amount*1.25
$fn = 30;
hinge_core(1000/100, 80/100, amount=5);
